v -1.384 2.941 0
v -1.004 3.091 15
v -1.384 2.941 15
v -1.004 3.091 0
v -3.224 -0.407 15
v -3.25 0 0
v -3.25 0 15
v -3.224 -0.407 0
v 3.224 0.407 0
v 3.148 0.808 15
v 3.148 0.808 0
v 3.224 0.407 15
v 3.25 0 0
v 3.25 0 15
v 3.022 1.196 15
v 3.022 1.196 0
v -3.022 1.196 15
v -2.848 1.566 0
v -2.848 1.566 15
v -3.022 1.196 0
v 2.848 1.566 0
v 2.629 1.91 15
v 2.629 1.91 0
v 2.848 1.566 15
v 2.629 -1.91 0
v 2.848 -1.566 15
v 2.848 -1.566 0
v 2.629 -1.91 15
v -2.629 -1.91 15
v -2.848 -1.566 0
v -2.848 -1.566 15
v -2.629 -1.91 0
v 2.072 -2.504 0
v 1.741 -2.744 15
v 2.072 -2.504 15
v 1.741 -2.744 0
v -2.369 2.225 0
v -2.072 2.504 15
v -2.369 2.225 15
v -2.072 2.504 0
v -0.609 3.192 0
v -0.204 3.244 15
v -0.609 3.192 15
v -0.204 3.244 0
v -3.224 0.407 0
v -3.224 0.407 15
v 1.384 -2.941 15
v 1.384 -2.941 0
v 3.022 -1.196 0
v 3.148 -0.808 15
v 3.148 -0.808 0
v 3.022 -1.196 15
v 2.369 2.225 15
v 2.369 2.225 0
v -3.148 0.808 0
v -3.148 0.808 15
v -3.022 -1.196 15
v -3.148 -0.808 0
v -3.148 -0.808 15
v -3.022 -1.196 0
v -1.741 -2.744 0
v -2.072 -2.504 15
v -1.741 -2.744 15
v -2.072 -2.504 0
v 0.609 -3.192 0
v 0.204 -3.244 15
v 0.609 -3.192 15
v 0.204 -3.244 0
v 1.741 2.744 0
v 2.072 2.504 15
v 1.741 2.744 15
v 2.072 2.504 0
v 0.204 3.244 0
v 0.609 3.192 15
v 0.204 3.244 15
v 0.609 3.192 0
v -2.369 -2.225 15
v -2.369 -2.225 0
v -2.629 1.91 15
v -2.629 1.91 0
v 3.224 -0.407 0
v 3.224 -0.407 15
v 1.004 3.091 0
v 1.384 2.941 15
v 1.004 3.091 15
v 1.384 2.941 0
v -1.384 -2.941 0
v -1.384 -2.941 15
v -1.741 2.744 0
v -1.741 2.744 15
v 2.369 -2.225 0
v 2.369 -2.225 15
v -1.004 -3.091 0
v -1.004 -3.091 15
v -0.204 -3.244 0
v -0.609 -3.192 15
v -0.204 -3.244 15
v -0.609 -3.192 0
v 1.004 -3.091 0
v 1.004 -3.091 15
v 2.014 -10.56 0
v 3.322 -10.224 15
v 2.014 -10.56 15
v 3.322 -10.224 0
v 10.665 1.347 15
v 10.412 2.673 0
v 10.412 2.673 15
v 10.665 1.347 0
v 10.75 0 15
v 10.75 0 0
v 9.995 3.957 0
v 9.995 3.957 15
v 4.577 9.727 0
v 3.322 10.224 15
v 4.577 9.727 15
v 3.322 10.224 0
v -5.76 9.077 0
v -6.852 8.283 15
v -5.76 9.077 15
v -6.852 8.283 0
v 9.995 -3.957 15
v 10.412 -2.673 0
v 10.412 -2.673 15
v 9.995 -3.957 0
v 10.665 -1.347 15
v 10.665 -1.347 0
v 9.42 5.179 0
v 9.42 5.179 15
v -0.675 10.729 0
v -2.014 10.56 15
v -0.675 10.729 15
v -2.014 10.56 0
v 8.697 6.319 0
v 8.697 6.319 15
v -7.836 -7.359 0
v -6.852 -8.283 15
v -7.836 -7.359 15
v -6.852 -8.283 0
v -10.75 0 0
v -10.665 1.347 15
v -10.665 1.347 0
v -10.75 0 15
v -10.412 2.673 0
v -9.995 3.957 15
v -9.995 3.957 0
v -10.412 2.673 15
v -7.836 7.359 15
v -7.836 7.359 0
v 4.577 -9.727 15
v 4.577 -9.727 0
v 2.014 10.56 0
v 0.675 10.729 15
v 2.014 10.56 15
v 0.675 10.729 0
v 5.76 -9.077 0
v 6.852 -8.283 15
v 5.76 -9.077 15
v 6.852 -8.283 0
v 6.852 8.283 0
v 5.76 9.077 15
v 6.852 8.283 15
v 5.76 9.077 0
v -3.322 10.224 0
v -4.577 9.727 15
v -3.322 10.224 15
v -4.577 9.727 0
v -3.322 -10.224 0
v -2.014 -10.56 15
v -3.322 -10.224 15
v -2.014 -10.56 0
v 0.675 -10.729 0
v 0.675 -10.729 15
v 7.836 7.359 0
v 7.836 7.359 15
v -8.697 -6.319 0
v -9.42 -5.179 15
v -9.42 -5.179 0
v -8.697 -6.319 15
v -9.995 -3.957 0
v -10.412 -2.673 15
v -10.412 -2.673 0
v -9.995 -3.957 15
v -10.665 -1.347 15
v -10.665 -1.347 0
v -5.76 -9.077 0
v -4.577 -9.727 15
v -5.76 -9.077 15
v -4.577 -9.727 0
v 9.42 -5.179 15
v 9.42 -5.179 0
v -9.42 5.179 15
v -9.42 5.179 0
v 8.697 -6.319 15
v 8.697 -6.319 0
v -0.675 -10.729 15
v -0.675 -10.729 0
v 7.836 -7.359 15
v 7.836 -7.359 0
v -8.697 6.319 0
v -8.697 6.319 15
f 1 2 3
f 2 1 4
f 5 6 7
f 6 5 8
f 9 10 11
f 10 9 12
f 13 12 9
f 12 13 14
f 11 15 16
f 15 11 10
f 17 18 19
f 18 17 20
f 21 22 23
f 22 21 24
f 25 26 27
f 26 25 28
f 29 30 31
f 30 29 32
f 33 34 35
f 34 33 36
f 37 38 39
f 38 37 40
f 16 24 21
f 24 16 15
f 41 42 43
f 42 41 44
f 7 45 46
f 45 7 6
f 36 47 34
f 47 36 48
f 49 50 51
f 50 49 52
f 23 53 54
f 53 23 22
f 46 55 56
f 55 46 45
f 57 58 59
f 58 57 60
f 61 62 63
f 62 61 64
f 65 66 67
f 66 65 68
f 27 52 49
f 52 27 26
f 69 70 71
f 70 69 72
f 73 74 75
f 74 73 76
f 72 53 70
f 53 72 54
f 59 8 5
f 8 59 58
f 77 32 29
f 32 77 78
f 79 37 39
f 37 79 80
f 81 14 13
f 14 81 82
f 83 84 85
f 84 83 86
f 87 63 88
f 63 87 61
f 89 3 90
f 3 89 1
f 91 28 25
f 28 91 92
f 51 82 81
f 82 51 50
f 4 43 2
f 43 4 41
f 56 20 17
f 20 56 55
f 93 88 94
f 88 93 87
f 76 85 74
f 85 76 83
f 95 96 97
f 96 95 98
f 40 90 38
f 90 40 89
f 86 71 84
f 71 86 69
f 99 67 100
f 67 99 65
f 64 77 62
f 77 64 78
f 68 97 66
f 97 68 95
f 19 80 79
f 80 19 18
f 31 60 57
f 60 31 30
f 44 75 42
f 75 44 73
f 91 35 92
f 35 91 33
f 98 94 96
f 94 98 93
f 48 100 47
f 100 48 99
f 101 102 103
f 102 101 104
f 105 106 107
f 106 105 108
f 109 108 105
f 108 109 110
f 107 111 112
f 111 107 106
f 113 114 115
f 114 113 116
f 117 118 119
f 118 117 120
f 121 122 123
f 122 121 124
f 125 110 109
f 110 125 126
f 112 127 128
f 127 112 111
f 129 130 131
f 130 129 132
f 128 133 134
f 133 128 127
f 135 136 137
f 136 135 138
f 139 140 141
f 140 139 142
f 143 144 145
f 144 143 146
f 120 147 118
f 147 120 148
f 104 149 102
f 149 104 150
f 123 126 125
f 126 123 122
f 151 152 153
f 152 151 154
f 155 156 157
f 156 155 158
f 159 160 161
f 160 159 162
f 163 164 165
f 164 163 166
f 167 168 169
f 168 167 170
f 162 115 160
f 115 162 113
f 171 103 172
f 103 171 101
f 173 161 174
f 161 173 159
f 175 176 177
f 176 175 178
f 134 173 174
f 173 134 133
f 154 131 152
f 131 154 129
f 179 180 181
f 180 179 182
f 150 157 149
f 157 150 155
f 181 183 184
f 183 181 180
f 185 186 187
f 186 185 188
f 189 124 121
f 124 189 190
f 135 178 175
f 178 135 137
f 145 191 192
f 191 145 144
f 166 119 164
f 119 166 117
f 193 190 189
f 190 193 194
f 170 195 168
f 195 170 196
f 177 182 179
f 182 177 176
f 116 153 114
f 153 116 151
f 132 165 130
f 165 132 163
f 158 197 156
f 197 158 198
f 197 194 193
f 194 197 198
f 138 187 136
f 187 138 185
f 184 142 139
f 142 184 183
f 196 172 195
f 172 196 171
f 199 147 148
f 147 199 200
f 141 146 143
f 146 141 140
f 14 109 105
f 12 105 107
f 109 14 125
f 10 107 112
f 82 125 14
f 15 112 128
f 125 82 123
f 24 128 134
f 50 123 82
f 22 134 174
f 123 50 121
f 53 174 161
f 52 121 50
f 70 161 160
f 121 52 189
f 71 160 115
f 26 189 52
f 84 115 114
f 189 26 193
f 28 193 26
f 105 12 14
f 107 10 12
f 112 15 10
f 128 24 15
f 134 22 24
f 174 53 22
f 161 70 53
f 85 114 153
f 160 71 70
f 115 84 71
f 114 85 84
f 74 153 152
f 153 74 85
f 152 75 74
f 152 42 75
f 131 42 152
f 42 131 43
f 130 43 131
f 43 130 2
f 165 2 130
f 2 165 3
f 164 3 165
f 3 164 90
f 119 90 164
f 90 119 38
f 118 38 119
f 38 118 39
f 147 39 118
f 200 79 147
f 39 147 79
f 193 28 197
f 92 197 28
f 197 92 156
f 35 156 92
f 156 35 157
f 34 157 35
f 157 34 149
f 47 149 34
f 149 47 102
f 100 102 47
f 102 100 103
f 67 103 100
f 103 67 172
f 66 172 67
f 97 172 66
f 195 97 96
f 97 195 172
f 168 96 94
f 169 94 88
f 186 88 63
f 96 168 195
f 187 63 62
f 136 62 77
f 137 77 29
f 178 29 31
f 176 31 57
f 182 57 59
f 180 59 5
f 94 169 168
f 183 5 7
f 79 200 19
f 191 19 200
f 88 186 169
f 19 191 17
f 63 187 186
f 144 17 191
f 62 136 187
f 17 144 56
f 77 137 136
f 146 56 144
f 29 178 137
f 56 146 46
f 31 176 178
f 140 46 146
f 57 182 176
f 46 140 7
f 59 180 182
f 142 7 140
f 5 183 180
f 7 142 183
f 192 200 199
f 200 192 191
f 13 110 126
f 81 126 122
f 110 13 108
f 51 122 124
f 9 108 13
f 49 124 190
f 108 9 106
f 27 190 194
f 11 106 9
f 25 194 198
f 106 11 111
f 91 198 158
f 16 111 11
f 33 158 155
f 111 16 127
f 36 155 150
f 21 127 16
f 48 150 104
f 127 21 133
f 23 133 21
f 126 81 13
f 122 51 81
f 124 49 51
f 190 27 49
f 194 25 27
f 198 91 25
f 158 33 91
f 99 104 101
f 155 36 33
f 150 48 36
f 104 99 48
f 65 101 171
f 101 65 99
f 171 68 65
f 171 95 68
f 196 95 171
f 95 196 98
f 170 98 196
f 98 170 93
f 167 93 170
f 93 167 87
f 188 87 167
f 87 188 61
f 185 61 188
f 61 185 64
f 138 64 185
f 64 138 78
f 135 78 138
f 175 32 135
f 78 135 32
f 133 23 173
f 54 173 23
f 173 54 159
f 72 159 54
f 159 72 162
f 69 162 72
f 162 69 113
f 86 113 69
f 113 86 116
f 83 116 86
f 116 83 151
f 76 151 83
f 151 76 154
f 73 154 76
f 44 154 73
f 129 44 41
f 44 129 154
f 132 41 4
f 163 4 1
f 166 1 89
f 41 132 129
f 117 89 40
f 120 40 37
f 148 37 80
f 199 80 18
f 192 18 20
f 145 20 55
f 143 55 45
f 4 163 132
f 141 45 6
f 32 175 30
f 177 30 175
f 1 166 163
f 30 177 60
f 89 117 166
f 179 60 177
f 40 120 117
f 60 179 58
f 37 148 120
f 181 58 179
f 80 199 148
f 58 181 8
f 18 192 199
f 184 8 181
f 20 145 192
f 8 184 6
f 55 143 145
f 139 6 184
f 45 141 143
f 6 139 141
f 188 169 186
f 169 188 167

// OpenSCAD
$fn = 50;


difference() {
	union() {
		*color(alpha = 1.0000000000, c = "gray") {
			translate(v = [0, 7, 0]) {
				linear_extrude(height = 1) {
					text(font = "Arial:style=Bold", halign = "center", size = 4.5000000000, text = "COMMENT circle main", valign = "center");
				}
			}
		}
		*color(alpha = 1.0000000000, c = "gray") {
			translate(v = [0, 14, 0]) {
				linear_extrude(height = 1.5000000000) {
					text(font = "Arial:style=Bold", halign = "center", size = 4.5000000000, text = "COMMENT description oobb_circle_shape_p_type_15_depth_1.5_diameter_15_thickness_1.5_width_1.5_height", valign = "center");
				}
			}
		}
		cylinder(h = 15, r = 10.7500000000);
	}
	union() {
		*color(alpha = 1.0000000000, c = "gray") {
			translate(v = [0, 7, 0]) {
				linear_extrude(height = 1) {
					text(font = "Arial:style=Bold", halign = "center", size = 4.5000000000, text = "COMMENT holes main", valign = "center");
				}
			}
		}
		*color(alpha = 1.0000000000, c = "gray") {
			translate(v = [0, 14, 0]) {
				linear_extrude(height = 1.5000000000) {
					text(font = "Arial:style=Bold", halign = "center", size = 4.5000000000, text = "COMMENT description oobb_holes_shape_n_type_1.5_diameter_15_thickness_1.5_width_1.5_height_true_both_holes_true_circle", valign = "center");
				}
			}
		}
		translate(v = [0.0000000000, 0.0000000000, -50.0000000000]) {
			cylinder(h = 100, r = 3.2500000000);
		}
		translate(v = [0.0000000000, 0.0000000000, -50.0000000000]) {
			cylinder(h = 100, r = 3.2500000000);
		}
		translate(v = [0.0000000000, 0.0000000000, -50.0000000000]) {
			cylinder(h = 100, r = 3.2500000000);
		}
	}
}
